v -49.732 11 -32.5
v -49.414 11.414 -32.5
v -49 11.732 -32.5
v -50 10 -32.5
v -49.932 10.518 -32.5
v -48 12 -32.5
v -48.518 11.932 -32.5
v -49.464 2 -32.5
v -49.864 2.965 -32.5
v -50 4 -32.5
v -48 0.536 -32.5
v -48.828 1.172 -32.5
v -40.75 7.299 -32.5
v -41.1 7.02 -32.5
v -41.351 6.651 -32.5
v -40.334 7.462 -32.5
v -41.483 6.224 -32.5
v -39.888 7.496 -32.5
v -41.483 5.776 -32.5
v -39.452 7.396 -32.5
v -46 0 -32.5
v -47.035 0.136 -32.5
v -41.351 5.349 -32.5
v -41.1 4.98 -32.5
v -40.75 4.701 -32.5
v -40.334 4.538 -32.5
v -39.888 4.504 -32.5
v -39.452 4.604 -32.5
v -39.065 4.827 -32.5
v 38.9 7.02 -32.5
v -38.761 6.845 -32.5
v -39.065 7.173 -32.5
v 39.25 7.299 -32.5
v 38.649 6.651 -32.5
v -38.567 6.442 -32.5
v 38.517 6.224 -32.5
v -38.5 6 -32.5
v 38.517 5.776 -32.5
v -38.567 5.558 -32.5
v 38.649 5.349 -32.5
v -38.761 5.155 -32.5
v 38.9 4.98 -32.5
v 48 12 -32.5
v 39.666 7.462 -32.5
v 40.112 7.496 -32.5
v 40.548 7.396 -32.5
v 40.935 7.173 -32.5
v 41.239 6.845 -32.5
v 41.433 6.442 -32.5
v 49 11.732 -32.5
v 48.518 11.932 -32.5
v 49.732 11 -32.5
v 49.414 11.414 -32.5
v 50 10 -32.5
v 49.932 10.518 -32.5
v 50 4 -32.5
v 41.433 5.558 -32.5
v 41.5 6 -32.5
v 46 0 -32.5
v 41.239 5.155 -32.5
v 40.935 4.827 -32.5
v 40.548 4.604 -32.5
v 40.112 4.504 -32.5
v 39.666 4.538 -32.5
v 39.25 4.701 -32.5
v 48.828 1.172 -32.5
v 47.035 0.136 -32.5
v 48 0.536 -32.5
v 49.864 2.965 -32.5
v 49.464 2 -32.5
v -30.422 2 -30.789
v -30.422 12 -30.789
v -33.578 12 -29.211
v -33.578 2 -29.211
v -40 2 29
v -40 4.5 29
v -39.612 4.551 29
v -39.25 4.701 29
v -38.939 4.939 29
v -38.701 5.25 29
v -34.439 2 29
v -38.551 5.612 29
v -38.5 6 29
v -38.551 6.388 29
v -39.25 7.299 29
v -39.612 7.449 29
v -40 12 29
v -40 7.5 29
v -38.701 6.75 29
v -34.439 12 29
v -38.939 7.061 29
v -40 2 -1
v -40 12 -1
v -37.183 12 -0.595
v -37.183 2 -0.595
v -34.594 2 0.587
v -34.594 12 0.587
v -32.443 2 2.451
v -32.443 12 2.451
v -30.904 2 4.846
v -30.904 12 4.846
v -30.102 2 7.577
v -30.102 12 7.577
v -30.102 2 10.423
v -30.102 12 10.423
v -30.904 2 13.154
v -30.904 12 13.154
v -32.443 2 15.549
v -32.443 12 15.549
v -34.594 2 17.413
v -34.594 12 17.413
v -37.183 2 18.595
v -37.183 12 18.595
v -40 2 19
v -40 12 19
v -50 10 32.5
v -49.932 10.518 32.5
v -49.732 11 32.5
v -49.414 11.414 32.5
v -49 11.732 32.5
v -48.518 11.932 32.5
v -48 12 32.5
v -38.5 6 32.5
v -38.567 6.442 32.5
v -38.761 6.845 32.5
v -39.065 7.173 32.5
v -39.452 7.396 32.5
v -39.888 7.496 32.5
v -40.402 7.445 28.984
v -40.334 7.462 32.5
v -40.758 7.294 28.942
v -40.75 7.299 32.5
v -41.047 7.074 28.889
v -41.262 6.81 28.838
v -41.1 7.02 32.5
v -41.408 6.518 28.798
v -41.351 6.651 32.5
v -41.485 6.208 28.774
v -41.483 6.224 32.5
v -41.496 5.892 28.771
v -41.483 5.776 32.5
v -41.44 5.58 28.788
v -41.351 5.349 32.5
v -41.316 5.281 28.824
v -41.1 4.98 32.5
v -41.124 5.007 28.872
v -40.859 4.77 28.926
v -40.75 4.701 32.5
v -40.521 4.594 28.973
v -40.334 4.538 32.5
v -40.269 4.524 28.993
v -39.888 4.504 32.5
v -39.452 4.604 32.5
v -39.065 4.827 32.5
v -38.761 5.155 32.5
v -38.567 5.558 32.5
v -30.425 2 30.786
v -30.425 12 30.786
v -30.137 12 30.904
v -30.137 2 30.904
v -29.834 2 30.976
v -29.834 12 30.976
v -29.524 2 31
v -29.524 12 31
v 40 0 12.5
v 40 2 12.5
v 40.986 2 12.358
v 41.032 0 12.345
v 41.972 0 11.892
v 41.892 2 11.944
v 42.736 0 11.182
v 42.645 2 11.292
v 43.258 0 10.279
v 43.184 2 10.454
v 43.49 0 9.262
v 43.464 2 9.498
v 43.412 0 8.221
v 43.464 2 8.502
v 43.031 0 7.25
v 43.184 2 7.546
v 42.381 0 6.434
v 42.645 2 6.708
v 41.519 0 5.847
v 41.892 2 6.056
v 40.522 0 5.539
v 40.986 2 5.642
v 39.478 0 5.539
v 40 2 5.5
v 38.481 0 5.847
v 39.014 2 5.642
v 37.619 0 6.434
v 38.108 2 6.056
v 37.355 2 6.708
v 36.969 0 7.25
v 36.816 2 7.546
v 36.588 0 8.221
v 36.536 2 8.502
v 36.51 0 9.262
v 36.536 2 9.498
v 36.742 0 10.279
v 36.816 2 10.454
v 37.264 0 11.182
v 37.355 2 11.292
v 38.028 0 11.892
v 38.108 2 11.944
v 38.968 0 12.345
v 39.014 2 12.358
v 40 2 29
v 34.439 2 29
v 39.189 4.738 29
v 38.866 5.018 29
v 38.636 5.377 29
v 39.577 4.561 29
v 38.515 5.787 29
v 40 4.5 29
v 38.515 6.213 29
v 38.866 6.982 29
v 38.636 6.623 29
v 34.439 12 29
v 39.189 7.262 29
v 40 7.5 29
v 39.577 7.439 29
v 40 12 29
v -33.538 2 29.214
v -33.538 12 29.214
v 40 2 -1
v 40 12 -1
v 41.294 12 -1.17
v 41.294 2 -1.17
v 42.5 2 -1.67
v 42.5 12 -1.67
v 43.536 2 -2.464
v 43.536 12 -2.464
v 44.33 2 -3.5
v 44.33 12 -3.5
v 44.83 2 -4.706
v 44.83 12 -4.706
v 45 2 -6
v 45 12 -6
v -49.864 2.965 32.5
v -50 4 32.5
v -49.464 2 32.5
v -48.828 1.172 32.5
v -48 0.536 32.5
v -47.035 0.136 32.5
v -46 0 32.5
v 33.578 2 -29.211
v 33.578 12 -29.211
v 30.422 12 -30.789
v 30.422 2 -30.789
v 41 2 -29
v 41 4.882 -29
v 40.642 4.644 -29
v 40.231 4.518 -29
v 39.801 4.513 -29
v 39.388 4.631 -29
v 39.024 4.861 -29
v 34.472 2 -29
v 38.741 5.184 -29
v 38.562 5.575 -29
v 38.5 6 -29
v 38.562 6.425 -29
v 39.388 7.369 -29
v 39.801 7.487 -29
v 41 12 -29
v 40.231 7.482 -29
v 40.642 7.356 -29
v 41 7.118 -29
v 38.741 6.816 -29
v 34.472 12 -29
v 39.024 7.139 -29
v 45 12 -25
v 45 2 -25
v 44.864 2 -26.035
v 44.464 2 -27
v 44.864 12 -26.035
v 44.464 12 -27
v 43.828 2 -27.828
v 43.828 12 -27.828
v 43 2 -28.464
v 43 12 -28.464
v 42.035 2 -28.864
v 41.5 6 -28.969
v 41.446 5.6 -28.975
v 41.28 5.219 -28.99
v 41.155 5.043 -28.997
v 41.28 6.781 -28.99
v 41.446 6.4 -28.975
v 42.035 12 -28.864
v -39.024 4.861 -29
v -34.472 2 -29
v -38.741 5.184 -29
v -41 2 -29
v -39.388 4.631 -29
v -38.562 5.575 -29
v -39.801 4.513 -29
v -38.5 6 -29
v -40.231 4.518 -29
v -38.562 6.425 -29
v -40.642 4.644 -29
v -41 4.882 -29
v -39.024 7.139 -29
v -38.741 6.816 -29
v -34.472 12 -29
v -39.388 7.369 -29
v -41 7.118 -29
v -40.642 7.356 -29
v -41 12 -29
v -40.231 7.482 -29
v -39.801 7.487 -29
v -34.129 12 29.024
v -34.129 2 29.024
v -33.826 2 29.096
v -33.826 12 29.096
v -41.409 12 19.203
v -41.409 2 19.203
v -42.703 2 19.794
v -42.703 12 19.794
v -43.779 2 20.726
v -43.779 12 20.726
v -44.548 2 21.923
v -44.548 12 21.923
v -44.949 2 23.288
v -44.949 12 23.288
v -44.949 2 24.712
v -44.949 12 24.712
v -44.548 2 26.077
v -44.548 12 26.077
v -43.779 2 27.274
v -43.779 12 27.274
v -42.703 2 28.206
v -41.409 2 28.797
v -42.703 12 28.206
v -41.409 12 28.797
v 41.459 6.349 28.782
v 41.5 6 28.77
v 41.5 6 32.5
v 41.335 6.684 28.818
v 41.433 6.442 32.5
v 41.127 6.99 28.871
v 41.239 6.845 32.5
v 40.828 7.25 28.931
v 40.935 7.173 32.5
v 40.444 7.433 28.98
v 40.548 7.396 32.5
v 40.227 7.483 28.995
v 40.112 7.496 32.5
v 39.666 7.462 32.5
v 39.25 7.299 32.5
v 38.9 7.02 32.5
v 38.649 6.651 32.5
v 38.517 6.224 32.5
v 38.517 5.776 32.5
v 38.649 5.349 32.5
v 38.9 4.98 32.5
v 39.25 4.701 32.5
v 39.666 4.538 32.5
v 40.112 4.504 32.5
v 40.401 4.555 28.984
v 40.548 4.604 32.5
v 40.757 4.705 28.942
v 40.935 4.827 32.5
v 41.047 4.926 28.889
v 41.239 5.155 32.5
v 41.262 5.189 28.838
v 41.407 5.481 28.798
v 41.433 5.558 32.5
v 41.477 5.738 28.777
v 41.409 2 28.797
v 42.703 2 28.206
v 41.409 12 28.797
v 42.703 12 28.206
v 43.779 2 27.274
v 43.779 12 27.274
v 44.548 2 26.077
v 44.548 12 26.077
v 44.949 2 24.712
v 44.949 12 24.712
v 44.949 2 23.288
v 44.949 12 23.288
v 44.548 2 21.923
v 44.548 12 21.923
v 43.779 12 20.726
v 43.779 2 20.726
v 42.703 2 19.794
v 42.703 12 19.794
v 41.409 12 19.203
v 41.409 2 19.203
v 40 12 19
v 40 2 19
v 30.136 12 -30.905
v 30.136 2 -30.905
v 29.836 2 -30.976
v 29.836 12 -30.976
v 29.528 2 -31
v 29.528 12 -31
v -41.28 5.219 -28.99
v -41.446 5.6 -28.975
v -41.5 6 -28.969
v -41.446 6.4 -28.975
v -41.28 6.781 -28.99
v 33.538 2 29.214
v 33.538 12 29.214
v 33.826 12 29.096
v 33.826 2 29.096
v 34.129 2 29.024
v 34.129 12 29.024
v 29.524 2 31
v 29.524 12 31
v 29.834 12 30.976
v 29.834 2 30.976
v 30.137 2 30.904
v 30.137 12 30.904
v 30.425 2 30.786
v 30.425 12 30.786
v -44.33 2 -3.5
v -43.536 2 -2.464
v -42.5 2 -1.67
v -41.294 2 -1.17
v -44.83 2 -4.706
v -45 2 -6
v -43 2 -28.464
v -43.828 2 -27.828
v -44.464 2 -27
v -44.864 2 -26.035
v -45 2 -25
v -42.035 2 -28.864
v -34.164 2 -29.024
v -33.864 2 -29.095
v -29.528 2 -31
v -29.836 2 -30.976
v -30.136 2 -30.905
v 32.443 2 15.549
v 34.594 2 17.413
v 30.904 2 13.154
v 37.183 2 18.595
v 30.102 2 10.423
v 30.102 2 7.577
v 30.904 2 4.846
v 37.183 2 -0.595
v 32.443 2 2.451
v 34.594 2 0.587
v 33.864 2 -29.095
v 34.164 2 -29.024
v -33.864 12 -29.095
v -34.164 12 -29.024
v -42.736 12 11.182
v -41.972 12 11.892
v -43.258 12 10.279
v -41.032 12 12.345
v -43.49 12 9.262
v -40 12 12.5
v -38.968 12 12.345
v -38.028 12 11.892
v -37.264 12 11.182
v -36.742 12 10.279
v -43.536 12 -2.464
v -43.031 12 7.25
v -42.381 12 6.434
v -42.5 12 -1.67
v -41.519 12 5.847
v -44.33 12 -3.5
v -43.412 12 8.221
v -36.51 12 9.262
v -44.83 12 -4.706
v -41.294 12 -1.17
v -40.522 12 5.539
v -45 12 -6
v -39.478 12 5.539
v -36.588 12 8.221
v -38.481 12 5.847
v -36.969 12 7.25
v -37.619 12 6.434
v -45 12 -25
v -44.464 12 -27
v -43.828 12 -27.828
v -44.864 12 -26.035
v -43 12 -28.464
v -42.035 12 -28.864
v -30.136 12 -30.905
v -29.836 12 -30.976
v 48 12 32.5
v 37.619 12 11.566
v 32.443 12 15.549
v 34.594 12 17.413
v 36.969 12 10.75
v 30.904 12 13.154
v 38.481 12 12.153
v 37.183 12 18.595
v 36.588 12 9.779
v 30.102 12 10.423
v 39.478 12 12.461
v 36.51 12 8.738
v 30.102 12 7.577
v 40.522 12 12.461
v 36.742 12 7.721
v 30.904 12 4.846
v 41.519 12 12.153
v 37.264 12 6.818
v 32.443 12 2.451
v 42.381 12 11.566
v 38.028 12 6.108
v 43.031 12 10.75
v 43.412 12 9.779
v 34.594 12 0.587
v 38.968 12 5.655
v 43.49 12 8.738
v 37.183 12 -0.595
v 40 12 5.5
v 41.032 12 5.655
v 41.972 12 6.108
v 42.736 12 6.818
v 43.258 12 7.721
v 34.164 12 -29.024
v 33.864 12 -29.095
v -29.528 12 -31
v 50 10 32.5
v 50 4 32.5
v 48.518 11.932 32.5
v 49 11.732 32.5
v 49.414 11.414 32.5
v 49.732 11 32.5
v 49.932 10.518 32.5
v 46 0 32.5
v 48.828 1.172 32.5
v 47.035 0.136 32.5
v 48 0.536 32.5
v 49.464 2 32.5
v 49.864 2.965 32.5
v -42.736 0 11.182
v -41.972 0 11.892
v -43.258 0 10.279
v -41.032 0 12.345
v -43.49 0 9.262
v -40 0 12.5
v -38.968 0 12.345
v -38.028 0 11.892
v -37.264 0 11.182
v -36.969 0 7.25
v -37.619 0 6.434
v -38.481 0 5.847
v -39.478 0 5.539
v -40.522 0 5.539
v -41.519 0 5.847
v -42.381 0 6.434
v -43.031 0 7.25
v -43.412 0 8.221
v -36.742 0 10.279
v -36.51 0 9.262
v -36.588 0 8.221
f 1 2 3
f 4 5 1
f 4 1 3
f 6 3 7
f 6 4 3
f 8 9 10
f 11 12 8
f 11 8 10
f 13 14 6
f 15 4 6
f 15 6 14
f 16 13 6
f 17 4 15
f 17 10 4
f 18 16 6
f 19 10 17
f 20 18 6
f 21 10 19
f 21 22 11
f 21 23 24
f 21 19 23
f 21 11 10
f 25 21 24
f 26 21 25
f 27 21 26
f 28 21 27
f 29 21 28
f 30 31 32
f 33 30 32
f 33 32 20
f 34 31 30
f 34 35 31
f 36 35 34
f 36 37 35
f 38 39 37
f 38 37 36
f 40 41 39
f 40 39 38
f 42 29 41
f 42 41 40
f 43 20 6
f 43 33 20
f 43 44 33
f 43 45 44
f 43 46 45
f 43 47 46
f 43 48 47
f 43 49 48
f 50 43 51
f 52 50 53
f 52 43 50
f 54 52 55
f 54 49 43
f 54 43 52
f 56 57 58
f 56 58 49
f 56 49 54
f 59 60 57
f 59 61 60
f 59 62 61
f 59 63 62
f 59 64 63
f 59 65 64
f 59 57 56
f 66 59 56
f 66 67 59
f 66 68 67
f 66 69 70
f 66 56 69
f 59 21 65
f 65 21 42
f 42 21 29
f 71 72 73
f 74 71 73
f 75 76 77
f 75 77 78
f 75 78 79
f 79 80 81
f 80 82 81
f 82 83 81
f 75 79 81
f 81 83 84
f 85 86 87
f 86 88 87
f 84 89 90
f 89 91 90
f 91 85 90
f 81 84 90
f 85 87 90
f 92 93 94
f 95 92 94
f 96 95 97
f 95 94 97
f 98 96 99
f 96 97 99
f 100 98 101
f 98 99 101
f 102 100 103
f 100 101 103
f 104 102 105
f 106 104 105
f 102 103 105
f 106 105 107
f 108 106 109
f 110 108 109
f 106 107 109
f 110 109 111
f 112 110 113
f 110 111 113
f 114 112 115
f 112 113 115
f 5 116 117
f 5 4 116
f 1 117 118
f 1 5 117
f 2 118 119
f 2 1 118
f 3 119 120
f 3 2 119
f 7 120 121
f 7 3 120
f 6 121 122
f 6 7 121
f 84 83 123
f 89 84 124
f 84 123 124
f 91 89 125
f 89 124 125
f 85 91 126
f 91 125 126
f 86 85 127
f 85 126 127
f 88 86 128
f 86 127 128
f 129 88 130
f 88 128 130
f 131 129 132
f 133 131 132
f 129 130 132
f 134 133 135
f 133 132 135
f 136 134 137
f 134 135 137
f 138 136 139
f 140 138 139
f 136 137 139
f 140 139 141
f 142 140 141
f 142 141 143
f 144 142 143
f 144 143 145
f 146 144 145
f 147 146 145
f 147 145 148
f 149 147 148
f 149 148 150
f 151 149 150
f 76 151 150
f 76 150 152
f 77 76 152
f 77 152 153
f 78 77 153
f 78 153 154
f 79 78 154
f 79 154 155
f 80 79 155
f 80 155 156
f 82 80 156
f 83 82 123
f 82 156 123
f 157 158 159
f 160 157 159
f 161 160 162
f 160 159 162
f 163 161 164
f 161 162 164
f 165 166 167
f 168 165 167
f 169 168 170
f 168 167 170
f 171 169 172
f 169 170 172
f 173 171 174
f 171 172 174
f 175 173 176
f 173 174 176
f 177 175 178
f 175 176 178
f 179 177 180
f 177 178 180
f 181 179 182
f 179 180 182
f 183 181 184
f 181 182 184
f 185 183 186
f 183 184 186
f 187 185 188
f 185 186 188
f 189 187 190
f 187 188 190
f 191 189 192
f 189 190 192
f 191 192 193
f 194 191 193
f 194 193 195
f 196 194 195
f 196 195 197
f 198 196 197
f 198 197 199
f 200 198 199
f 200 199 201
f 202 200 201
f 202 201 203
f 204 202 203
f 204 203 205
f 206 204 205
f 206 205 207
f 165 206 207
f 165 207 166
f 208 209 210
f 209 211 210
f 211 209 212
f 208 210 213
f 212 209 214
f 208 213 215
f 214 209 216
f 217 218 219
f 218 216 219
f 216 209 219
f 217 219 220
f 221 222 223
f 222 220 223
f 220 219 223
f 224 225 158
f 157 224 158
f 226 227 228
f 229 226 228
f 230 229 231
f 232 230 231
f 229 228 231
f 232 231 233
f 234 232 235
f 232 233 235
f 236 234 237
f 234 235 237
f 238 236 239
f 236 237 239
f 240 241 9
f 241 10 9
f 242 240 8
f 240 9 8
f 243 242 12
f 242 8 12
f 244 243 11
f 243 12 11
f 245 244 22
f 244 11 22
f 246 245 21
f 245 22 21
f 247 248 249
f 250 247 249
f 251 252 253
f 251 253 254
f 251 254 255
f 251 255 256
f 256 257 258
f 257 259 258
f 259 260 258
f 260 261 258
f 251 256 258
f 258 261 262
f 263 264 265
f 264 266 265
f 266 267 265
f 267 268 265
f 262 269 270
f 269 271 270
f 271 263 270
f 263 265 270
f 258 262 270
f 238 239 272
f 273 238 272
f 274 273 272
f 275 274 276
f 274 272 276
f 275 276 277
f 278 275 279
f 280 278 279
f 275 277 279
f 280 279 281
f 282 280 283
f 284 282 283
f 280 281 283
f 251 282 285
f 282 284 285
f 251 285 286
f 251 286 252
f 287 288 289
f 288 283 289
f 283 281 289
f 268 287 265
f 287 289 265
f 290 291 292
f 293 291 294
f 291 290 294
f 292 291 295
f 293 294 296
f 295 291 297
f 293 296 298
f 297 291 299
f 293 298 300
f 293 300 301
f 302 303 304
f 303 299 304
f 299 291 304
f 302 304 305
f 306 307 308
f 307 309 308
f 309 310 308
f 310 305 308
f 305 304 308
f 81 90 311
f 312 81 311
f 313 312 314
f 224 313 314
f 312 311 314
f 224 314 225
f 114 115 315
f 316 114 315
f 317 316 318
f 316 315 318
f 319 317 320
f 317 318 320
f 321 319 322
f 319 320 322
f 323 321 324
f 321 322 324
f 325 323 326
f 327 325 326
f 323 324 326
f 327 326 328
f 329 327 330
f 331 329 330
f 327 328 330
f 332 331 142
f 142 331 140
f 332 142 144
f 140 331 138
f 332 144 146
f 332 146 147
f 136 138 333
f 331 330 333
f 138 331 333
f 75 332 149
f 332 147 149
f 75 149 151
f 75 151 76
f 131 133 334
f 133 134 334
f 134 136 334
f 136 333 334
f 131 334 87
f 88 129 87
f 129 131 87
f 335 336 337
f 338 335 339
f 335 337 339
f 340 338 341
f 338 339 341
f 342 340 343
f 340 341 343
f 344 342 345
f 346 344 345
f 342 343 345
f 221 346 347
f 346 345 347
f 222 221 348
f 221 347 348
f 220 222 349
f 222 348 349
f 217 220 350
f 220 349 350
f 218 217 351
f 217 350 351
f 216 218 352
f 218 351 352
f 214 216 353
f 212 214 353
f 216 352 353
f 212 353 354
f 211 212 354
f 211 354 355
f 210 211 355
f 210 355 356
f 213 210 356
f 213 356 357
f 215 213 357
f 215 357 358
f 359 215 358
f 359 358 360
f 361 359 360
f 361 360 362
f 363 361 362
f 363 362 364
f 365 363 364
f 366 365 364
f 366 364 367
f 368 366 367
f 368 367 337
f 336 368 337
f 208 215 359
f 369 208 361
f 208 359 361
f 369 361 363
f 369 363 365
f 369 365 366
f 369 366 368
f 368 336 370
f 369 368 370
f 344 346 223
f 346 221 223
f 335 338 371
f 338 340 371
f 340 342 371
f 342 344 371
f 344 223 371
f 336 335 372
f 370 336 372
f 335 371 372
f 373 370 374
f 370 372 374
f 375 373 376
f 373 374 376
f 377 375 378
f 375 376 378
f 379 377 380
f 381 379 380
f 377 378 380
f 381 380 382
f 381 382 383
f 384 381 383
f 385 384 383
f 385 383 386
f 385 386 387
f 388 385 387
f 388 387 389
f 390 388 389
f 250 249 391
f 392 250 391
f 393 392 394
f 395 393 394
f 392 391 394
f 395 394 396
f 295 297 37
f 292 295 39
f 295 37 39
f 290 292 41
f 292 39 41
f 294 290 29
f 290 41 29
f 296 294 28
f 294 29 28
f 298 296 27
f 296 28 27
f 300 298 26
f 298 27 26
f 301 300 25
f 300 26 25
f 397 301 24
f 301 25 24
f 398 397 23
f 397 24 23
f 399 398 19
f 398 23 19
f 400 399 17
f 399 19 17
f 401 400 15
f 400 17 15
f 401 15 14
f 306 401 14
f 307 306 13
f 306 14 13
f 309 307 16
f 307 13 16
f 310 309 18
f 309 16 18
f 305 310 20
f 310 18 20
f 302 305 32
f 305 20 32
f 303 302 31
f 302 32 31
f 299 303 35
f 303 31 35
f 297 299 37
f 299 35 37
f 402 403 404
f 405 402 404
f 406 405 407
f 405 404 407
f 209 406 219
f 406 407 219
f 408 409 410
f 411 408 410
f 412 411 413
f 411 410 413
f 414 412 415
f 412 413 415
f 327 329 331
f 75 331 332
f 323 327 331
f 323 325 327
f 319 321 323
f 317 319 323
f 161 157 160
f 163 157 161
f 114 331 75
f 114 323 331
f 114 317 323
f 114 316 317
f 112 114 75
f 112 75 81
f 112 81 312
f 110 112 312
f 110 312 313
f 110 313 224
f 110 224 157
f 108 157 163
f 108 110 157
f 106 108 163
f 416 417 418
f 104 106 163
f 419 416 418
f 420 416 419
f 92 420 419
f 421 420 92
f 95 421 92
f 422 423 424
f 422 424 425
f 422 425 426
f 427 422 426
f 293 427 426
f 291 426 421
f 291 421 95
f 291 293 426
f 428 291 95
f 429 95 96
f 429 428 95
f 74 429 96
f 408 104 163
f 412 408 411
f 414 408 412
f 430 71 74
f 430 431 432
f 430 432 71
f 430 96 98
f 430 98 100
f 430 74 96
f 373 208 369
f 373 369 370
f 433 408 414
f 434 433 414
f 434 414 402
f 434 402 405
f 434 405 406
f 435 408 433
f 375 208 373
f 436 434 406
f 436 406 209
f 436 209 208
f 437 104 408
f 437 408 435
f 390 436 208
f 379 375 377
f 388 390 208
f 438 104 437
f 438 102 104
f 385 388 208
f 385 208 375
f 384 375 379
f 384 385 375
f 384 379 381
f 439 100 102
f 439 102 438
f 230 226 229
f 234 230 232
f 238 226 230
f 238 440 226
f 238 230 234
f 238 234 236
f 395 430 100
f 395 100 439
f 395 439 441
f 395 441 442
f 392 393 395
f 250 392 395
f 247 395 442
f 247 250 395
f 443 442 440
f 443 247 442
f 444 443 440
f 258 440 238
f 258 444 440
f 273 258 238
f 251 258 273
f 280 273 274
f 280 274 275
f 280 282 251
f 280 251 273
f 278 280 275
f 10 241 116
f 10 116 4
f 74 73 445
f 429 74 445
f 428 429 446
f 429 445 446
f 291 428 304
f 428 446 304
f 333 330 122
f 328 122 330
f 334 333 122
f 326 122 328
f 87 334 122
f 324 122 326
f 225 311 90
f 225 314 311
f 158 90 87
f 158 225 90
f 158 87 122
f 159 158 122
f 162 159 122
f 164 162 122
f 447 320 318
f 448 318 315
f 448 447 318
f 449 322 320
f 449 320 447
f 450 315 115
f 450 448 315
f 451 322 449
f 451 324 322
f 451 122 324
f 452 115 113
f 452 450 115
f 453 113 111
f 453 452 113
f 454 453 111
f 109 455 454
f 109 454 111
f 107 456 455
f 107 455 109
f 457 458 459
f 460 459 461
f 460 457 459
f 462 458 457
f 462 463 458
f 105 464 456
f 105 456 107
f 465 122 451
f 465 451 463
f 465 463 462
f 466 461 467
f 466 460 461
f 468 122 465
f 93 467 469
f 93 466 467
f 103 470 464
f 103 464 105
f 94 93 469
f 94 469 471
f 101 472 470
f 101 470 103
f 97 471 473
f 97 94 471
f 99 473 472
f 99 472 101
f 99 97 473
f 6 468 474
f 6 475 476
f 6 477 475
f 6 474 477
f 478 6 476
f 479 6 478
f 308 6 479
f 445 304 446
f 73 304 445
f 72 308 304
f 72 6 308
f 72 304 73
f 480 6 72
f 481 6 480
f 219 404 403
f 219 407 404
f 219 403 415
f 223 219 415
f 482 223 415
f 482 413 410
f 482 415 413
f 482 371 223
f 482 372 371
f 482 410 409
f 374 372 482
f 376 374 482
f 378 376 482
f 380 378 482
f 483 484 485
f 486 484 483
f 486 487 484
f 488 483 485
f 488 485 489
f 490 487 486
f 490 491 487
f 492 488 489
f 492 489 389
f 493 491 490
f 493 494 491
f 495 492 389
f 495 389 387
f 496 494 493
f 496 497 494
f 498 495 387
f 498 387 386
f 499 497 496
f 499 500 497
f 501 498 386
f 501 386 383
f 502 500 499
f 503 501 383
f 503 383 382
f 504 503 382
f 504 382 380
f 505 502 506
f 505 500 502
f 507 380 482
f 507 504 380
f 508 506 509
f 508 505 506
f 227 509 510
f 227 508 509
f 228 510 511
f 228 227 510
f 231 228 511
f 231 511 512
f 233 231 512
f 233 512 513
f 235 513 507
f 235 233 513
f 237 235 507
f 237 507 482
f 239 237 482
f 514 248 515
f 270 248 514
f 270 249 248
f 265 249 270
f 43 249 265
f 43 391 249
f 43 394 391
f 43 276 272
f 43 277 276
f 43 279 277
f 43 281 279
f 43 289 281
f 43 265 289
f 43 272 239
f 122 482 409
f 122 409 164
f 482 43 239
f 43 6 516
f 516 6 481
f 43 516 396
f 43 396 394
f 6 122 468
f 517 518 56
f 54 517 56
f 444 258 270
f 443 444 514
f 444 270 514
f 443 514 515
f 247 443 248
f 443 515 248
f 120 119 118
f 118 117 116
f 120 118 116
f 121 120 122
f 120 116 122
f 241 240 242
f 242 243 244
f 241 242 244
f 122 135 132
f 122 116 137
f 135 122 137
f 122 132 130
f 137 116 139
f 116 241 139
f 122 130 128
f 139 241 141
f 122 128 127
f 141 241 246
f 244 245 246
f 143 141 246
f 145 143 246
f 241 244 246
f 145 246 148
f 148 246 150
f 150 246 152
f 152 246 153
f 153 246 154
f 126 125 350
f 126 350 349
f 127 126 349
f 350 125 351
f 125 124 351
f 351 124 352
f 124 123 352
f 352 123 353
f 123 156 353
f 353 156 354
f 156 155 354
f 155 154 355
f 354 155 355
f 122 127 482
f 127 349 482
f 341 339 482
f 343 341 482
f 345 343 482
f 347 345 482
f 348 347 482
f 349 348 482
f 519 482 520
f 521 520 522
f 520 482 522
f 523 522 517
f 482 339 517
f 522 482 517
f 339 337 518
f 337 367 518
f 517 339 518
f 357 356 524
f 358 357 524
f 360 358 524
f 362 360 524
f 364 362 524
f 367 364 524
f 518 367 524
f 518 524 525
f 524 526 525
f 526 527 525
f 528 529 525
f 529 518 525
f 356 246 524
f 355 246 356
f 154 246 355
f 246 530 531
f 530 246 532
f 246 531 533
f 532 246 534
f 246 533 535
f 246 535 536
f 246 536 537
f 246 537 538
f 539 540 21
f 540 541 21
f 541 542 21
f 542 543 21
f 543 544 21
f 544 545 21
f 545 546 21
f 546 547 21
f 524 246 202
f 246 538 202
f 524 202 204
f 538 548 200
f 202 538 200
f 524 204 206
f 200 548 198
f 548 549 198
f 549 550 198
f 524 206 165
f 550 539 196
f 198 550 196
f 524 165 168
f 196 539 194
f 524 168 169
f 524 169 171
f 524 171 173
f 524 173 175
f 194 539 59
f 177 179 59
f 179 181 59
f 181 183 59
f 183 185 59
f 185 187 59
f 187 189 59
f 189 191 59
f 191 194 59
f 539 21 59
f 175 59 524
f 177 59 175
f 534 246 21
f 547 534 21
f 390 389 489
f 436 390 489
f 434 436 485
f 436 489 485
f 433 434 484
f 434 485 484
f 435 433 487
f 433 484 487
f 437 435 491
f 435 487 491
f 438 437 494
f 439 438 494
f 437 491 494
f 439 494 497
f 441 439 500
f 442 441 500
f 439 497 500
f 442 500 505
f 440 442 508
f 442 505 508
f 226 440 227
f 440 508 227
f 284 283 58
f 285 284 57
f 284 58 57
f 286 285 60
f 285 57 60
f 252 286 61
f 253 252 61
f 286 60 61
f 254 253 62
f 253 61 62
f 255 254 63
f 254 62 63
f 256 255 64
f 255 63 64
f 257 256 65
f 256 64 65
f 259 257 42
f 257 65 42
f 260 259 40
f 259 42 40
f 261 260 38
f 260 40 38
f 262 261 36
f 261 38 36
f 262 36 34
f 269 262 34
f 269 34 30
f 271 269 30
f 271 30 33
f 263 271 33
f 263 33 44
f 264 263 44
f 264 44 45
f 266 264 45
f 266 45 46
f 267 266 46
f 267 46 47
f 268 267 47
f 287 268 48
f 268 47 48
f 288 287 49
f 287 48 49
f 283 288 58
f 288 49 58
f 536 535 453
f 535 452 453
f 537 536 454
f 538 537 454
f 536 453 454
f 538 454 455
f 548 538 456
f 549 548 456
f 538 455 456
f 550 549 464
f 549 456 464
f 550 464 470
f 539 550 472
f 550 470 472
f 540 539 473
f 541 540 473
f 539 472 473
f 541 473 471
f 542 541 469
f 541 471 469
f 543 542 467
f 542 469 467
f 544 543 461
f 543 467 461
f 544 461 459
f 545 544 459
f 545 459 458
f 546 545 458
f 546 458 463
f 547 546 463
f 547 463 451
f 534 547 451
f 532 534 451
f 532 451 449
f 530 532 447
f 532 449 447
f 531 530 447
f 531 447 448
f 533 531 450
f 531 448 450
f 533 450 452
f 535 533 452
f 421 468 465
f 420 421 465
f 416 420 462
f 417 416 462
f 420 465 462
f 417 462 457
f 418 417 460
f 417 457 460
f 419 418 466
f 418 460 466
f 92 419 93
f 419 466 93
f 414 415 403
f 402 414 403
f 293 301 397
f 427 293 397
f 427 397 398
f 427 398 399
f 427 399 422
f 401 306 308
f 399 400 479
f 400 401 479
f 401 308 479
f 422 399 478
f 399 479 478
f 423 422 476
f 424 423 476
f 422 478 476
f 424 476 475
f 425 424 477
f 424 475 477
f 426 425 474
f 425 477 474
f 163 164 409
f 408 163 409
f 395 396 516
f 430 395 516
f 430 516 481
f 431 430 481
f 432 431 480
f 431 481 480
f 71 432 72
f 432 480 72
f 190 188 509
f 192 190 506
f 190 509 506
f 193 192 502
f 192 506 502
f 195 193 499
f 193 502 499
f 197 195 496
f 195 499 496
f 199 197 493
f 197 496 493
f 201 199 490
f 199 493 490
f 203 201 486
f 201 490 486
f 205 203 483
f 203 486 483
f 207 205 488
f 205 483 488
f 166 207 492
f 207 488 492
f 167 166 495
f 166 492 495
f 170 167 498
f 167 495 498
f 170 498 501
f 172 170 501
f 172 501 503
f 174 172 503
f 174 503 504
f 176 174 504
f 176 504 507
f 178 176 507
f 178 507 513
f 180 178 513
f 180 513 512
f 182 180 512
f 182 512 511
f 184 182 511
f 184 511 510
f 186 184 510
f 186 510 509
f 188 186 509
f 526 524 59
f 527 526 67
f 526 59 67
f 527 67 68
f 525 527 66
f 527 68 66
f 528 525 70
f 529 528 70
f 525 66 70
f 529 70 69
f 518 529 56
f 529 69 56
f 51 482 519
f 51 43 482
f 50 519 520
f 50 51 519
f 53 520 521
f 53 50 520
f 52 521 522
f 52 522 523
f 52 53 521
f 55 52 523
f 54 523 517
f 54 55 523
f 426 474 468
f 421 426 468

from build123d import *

# Parameters (mm, degrees)
SKETCH_1_W          = 100
SKETCH_1_H          = 65
EXTRUDE_1_DEPTH     = 12
SKETCH_2_R          = 3.5
CUT_EXTRUDE_2_DEPTH = 10
SKETCH_3_R          = 3.5
CUT_EXTRUDE_3_DEPTH = 61.466933112
SKETCH_4_R          = 3.5
CUT_EXTRUDE_4_DEPTH = 61.466933112
CUT_EXTRUDE_5_REACH = 84.879
SKETCH_5_R          = 1.5
CUT_EXTRUDE_6_REACH = 84.879
SKETCH_6_R          = 1.5
FILLET_3_R          = 2
FILLET_4_R          = 4


with BuildPart() as part:
    # 草图1 → 凸台-拉伸1 (new body)
    with BuildSketch(Plane(origin=(0, 0, 0), x_dir=(1, 0, 0), z_dir=(0, 1, 0))):
        Rectangle(SKETCH_1_W, SKETCH_1_H)
    extrude(amount=EXTRUDE_1_DEPTH)

    # 草图2 → 切除-拉伸2 (cut)
    with BuildSketch(Plane(origin=(0, 12, 0), x_dir=(1, 0, 0), z_dir=(0, 1, 0))):
        with Locations(Location((-40, -9, 0), (0, 0, 270))):
            Circle(SKETCH_2_R)
        with Locations(Location((40, -9, 0), (0, 0, 90))):
            Circle(SKETCH_2_R)
        with BuildLine():
            Line((-30.422291236, 30.788854382), (-33.577708764, 29.211145618))
            ThreePointArc((-33.577708764, 29.211145618), (-34.012630114, 29.053502021), (-34.472135955, 29))
            Line((-34.472135955, 29), (-41, 29))
            ThreePointArc((-41, 29), (-43.828427125, 27.828427125), (-45, 25))
            Line((-45, 25), (-45, 6))
            ThreePointArc((-45, 6), (-43.535533906, 2.464466094), (-40, 1))
            ThreePointArc((-40, 1), (-30, -9), (-40, -19))
            ThreePointArc((-40, -19), (-45, -24), (-40, -29))
            Line((-40, -29), (-34.439229319, -29))
            ThreePointArc((-34.439229319, -29), (-33.976113717, -29.054357705), (-33.538172016, -29.214476061))
            Line((-33.538172016, -29.214476061), (-30.425003094, -30.785523939))
            ThreePointArc((-30.425003094, -30.785523939), (-29.987061393, -30.945642295), (-29.52394579, -31))
            Line((-29.52394579, -31), (29.52394579, -31))
            ThreePointArc((29.52394579, -31), (29.987061393, -30.945642295), (30.425003094, -30.785523939))
            Line((30.425003094, -30.785523939), (33.538172016, -29.214476061))
            ThreePointArc((33.538172016, -29.214476061), (33.976113717, -29.054357705), (34.439229319, -29))
            Line((34.439229319, -29), (40, -29))
            ThreePointArc((40, -29), (45, -24), (40, -19))
            ThreePointArc((40, -19), (30, -9), (40, 1))
            ThreePointArc((40, 1), (43.535533906, 2.464466094), (45, 6))
            Line((45, 6), (45, 25))
            ThreePointArc((45, 25), (43.828427125, 27.828427125), (41, 29))
            Line((41, 29), (34.472135955, 29))
            ThreePointArc((34.472135955, 29), (34.012630114, 29.053502021), (33.577708764, 29.211145618))
            Line((33.577708764, 29.211145618), (30.422291236, 30.788854382))
            ThreePointArc((30.422291236, 30.788854382), (29.987369886, 30.946497979), (29.527864045, 31))
            Line((29.527864045, 31), (-29.527864045, 31))
            ThreePointArc((-29.527864045, 31), (-29.987369886, 30.946497979), (-30.422291236, 30.788854382))
        make_face()
    extrude(amount=-CUT_EXTRUDE_2_DEPTH, mode=Mode.SUBTRACT)

    # 草图3 → 切除-拉伸3 (cut, through all)
    with BuildSketch(Plane(origin=(0, 2, 0), x_dir=(1, 0, 0), z_dir=(0, 1, 0))):
        with Locations(Location((-40, -9, 0), (0, 0, 270))):
            Circle(SKETCH_3_R)
    extrude(amount=-CUT_EXTRUDE_3_DEPTH, mode=Mode.SUBTRACT)

    # 草图4 → 切除-拉伸4 (cut, through all)
    with BuildSketch(Plane(origin=(0, 2, 0), x_dir=(1, 0, 0), z_dir=(0, 1, 0))):
        with Locations(Location((40, -9, 0), (0, 0, 270))):
            Circle(SKETCH_4_R)
    extrude(amount=-CUT_EXTRUDE_4_DEPTH, mode=Mode.SUBTRACT)

    # 草图5 → 切除-拉伸5 (cut, up to next)
    with BuildSketch(Plane.XY.offset(32.5), mode=Mode.PRIVATE) as cut_extrude_5_sk1:
        with Locations((-40, 6)):
            Circle(SKETCH_5_R)
    cut_extrude_5_tool1 = extrude(cut_extrude_5_sk1.sketch, amount=-CUT_EXTRUDE_5_REACH, mode=Mode.PRIVATE) & part.part
    # 草图5 → 切除-拉伸5 (cut, up to next)
    with BuildSketch(Plane.XY.offset(32.5), mode=Mode.PRIVATE) as cut_extrude_5_sk2:
        with Locations((40, 6)):
            Circle(SKETCH_5_R)
    cut_extrude_5_tool2 = extrude(cut_extrude_5_sk2.sketch, amount=-CUT_EXTRUDE_5_REACH, mode=Mode.PRIVATE) & part.part
    add(cut_extrude_5_tool1.solids().sort_by_distance((-40, 6, 32.5))[0], mode=Mode.SUBTRACT)
    add(cut_extrude_5_tool2.solids().sort_by_distance((40, 6, 32.5))[0], mode=Mode.SUBTRACT)

    # 草图6 → 切除-拉伸6 (cut, up to next)
    with BuildSketch(Plane(origin=(0, 0, -32.5), x_dir=(-1, 0, 0), z_dir=(0, 0, -1)), mode=Mode.PRIVATE) as cut_extrude_6_sk1:
        with Locations(Location((-40, 6, 0), (0, 0, 180))):
            Circle(SKETCH_6_R)
    cut_extrude_6_tool1 = extrude(cut_extrude_6_sk1.sketch, amount=-CUT_EXTRUDE_6_REACH, mode=Mode.PRIVATE) & part.part
    # 草图6 → 切除-拉伸6 (cut, up to next)
    with BuildSketch(Plane(origin=(0, 0, -32.5), x_dir=(-1, 0, 0), z_dir=(0, 0, -1)), mode=Mode.PRIVATE) as cut_extrude_6_sk2:
        with Locations(Location((40, 6, 0), (0, 0, 180))):
            Circle(SKETCH_6_R)
    cut_extrude_6_tool2 = extrude(cut_extrude_6_sk2.sketch, amount=-CUT_EXTRUDE_6_REACH, mode=Mode.PRIVATE) & part.part
    add(cut_extrude_6_tool1.solids().sort_by_distance((40, 6, -32.5))[0], mode=Mode.SUBTRACT)
    add(cut_extrude_6_tool2.solids().sort_by_distance((-40, 6, -32.5))[0], mode=Mode.SUBTRACT)

    # 圆角3
    fillet_3_edges = [part.edges().sort_by_distance(p)[0] for p in [
        (-50, 12, 0),
        (50, 12, 0),
    ]]
    fillet(fillet_3_edges, radius=FILLET_3_R)

    # 圆角4
    fillet_4_edges = [part.edges().sort_by_distance(p)[0] for p in [
        (-50, 0, 0),
        (50, 0, 0),
    ]]
    fillet(fillet_4_edges, radius=FILLET_4_R)


solid = part.part
